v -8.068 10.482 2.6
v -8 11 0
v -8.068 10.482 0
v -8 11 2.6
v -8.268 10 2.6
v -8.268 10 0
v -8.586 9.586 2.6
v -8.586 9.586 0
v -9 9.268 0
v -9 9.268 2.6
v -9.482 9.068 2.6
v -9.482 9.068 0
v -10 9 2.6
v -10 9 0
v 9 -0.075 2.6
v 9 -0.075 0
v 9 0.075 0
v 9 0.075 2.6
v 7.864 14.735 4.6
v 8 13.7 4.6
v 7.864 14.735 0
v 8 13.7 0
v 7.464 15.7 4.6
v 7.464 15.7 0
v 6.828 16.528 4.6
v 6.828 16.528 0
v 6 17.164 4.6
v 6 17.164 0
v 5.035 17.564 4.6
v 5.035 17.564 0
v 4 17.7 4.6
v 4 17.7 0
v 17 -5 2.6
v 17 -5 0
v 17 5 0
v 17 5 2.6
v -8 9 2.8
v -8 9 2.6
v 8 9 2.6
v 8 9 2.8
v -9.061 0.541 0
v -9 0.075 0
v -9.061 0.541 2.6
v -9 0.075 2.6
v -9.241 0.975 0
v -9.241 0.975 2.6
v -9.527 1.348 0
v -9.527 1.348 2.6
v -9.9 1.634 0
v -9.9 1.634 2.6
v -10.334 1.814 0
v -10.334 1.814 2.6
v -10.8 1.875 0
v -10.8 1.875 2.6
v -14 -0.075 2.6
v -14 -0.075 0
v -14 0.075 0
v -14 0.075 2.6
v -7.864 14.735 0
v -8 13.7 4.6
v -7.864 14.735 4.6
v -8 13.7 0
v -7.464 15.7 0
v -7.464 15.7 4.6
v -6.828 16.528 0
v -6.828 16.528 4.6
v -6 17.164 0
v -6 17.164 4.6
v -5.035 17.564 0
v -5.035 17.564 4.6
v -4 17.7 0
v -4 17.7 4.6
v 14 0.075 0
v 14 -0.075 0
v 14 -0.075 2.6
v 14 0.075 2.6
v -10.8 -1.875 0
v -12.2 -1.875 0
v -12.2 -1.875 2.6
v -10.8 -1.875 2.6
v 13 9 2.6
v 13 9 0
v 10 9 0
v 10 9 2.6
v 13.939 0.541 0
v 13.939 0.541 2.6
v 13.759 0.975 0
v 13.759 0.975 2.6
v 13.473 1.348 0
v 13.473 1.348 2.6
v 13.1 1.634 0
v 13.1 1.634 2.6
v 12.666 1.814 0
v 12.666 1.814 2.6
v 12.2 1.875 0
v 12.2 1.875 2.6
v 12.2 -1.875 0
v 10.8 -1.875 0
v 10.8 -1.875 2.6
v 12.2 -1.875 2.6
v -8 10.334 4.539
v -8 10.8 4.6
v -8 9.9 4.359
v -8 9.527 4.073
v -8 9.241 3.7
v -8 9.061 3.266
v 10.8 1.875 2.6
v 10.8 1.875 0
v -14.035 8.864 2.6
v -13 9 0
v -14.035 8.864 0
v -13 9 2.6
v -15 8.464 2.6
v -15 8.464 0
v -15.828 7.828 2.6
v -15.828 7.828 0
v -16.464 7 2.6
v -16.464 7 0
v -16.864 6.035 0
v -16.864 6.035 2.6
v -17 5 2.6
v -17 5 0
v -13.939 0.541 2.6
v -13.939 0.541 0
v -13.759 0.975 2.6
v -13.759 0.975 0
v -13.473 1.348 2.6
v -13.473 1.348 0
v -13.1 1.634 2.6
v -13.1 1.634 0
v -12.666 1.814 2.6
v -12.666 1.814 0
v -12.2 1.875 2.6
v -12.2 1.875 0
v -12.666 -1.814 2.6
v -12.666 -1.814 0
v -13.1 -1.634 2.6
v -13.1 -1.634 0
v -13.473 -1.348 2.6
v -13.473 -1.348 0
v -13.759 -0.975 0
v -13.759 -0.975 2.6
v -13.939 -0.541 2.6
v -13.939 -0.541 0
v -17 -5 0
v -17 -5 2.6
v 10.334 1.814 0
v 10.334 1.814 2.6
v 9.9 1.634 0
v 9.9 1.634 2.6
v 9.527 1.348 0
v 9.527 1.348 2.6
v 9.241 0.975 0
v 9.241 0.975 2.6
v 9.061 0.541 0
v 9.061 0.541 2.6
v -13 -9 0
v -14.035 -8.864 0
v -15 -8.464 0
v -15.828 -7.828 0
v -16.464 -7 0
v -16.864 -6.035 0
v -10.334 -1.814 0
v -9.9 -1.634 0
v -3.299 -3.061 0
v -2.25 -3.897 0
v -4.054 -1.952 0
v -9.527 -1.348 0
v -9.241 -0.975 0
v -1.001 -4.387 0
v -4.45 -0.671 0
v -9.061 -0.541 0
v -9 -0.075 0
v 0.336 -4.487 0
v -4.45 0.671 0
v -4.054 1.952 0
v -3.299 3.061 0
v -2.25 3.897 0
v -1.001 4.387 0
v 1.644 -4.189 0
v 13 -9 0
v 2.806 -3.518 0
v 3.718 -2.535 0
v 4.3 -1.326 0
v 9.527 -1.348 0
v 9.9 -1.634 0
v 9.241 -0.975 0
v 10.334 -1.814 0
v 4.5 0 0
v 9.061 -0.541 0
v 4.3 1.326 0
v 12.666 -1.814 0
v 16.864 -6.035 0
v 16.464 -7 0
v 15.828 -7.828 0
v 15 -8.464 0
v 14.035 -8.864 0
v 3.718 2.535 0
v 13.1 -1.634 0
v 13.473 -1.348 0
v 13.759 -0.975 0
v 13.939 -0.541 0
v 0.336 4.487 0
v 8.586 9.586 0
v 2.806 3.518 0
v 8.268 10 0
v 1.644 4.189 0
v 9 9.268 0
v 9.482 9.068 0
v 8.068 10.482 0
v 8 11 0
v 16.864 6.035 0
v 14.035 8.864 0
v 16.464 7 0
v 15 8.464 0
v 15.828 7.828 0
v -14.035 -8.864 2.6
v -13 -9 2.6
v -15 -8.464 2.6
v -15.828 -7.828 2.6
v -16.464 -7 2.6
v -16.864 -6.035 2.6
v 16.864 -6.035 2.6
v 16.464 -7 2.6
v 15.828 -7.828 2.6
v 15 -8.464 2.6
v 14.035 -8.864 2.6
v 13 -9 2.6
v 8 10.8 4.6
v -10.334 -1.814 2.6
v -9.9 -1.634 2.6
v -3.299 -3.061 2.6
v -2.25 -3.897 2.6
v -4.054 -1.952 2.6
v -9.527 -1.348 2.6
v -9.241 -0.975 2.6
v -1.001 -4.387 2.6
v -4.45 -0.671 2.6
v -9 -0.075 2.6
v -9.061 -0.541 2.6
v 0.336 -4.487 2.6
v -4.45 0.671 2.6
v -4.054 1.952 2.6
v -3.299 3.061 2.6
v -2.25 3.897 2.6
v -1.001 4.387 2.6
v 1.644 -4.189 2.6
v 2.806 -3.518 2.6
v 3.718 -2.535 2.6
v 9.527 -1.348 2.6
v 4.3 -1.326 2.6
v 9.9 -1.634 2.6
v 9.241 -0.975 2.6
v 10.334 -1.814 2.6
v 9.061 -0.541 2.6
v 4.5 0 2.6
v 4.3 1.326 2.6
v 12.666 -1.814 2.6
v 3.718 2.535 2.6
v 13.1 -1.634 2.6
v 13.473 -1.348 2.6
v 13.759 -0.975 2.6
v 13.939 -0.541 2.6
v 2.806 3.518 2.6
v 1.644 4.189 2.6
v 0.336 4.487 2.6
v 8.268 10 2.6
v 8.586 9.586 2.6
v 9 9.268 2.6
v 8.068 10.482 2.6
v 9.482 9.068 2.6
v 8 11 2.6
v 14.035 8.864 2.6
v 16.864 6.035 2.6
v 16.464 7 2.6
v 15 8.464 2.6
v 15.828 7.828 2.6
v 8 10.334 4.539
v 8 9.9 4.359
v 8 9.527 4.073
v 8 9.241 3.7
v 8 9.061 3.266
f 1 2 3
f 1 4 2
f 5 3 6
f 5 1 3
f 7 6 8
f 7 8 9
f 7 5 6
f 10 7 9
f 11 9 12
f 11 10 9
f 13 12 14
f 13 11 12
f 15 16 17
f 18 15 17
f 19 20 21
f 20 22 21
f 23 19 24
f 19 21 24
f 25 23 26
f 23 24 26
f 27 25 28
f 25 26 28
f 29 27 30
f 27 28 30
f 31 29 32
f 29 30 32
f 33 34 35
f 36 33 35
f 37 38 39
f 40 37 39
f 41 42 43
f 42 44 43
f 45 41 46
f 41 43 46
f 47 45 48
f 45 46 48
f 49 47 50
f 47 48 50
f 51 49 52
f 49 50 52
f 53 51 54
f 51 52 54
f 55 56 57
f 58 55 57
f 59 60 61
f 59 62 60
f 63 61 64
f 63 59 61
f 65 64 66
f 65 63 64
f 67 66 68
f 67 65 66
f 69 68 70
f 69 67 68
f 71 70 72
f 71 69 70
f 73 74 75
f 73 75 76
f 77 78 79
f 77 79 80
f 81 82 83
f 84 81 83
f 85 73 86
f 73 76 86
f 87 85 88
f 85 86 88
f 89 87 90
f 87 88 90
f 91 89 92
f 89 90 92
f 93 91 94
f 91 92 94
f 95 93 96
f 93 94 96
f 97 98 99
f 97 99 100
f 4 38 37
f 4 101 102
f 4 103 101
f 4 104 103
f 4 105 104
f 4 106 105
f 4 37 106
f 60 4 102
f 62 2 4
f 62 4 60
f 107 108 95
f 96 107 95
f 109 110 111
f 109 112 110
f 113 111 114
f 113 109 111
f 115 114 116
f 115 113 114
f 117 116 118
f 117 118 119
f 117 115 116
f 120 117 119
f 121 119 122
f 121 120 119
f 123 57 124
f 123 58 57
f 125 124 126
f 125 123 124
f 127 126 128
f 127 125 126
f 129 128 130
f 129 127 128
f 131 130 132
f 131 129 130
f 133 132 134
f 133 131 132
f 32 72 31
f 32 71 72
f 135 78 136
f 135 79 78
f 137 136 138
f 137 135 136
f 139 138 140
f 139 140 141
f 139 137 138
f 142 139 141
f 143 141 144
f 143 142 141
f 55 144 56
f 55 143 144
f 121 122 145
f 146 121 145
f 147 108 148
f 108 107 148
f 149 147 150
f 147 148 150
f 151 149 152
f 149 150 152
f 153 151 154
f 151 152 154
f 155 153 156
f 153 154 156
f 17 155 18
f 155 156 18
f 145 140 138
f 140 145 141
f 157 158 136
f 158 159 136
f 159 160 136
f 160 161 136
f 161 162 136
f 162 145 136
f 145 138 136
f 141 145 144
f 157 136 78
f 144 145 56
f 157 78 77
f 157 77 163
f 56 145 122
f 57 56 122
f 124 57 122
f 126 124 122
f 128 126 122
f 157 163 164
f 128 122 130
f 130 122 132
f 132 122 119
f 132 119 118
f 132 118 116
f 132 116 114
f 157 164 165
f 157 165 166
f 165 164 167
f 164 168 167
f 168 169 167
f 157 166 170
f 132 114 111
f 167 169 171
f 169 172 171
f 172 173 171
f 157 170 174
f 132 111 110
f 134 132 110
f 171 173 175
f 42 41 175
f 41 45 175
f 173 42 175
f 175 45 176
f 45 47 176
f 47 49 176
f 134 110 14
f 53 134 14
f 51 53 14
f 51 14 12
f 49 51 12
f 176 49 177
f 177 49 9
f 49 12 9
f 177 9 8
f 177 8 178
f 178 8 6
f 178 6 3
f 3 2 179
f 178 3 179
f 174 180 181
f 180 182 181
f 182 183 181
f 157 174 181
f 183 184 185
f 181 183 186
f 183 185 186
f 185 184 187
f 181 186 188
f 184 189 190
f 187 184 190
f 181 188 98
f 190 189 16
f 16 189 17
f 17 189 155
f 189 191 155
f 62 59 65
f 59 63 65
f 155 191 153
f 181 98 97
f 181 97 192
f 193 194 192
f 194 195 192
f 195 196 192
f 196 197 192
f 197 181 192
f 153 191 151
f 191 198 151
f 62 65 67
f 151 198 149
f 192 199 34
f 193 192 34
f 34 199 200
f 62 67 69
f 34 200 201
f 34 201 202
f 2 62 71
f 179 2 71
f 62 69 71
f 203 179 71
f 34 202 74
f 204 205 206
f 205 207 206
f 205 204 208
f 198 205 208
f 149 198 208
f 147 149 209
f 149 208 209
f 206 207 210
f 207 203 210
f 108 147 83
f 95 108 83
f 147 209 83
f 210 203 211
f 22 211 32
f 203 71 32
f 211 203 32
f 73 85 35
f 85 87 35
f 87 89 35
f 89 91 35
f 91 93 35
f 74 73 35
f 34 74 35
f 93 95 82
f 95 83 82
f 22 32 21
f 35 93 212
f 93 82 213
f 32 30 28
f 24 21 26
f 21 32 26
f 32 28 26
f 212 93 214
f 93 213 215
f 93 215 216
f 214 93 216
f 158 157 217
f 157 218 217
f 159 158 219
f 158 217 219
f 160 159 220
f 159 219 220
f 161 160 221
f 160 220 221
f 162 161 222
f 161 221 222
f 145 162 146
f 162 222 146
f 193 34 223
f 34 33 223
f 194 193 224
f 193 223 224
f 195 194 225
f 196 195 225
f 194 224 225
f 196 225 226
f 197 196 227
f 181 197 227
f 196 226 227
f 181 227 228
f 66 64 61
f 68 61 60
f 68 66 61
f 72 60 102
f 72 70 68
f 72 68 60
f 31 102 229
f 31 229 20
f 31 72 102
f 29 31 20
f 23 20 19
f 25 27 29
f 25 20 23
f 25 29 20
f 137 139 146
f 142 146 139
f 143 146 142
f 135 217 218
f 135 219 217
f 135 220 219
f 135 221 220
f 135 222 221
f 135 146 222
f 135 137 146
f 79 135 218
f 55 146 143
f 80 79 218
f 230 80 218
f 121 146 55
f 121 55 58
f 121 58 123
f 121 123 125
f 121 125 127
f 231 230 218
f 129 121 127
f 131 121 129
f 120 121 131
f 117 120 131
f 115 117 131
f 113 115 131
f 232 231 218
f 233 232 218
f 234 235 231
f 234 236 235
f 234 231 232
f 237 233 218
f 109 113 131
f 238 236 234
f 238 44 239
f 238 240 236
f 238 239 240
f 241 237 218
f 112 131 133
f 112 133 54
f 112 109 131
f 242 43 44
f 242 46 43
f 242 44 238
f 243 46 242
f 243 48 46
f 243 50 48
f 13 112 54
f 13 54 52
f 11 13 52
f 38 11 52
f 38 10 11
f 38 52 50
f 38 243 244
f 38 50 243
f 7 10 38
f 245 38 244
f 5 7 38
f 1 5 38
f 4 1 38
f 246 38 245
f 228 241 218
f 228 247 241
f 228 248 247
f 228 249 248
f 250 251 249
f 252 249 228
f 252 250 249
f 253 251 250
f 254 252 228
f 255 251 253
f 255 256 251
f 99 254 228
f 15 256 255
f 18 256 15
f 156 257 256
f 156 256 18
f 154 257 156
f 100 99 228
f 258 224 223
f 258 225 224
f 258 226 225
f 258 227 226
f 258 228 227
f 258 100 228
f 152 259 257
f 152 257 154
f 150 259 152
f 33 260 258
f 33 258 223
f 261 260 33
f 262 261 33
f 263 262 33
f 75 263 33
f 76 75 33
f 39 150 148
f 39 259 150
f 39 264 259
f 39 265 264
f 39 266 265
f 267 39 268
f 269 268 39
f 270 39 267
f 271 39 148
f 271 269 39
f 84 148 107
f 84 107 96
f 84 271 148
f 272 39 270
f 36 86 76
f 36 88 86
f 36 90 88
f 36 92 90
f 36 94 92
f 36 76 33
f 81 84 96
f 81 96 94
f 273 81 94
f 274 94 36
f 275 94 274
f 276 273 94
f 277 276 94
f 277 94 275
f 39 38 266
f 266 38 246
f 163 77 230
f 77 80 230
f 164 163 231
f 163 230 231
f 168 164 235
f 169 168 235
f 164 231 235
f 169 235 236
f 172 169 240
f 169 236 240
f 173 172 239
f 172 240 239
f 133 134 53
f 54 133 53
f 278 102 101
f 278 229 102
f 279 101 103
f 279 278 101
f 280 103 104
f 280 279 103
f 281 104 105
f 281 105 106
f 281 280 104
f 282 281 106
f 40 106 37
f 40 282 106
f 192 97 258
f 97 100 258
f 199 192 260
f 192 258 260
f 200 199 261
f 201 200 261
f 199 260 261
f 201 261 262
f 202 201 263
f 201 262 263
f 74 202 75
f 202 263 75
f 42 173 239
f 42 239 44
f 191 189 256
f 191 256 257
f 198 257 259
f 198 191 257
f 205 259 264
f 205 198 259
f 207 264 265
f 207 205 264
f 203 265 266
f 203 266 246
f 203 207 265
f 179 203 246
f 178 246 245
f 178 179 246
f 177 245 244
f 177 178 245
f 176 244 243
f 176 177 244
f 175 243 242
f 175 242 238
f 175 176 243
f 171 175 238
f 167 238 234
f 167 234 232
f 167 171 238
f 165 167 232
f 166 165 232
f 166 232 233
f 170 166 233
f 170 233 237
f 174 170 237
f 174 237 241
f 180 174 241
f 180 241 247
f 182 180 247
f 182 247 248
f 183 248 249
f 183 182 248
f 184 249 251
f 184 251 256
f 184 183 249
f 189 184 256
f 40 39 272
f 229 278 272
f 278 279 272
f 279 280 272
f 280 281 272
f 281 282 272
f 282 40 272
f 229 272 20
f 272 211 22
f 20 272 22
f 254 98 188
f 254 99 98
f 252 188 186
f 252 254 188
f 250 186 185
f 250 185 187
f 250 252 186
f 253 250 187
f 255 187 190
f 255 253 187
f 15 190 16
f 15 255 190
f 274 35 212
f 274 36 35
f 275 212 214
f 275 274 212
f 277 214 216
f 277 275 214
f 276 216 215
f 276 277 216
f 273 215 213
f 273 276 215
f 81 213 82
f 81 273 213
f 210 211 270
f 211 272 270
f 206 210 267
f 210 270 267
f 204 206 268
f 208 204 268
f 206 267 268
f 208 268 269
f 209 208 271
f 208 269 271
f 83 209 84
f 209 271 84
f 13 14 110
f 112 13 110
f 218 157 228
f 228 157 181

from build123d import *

# Parameters (mm, degrees)
F0_W     = 5
F0_H     = 3.75
F0_R     = 4.5
F1_DEPTH = 2.6
F2_W     = 16
F2_H     = 8.7
F3_DEPTH = 2
F4_R     = 4
F5_R     = 1.8
F6_R     = 2


with BuildPart() as f1:
    # F0 (on Top) → F1 (new body)
    with BuildSketch(Plane.XY):
        Polygon((17, -9), (17, 9), (8, 9), (8, 17.7), (-8, 17.7), (-8, 9), (-17, 9), (-17, -9), align=None)
        with Locations((-11.5, 0)):
            Rectangle(F0_W, F0_H, mode=Mode.SUBTRACT)
        Circle(F0_R, mode=Mode.SUBTRACT)
        with Locations((11.5, 0)):
            Rectangle(F0_W, F0_H, mode=Mode.SUBTRACT)
    extrude(amount=F1_DEPTH)

    # F2 (on face) → F3 (join)
    with BuildSketch(Plane.XY.offset(2.6)):
        with Locations((0, 13.35)):
            Rectangle(F2_W, F2_H)
    extrude(amount=F3_DEPTH)

    # F4
    f4_edges = [f1.edges().sort_by_distance(p)[0] for p in [
        (17, 9, 1.3),
        (17, -9, 1.3),
        (-17, 9, 1.3),
        (-17, -9, 1.3),
        (8, 17.7, 2.3),
        (-8, 17.7, 2.3),
    ]]
    fillet(f4_edges, radius=F4_R)

    # F5
    f5_edges = [f1.edges().sort_by_distance(p)[0] for p in [
        (0, 9, 4.6),
        (-14, 1.875, 1.3),
        (-14, -1.875, 1.3),
        (-9, 1.875, 1.3),
        (-9, -1.875, 1.3),
        (14, 1.875, 1.3),
        (9, 1.875, 1.3),
        (9, -1.875, 1.3),
        (14, -1.875, 1.3),
    ]]
    fillet(f5_edges, radius=F5_R)

    # F6
    f6_edges = [f1.edges().sort_by_distance(p)[0] for p in [
        (8, 9, 1.3),
        (-8, 9, 1.3),
    ]]
    fillet(f6_edges, radius=F6_R)


solid = f1.part
